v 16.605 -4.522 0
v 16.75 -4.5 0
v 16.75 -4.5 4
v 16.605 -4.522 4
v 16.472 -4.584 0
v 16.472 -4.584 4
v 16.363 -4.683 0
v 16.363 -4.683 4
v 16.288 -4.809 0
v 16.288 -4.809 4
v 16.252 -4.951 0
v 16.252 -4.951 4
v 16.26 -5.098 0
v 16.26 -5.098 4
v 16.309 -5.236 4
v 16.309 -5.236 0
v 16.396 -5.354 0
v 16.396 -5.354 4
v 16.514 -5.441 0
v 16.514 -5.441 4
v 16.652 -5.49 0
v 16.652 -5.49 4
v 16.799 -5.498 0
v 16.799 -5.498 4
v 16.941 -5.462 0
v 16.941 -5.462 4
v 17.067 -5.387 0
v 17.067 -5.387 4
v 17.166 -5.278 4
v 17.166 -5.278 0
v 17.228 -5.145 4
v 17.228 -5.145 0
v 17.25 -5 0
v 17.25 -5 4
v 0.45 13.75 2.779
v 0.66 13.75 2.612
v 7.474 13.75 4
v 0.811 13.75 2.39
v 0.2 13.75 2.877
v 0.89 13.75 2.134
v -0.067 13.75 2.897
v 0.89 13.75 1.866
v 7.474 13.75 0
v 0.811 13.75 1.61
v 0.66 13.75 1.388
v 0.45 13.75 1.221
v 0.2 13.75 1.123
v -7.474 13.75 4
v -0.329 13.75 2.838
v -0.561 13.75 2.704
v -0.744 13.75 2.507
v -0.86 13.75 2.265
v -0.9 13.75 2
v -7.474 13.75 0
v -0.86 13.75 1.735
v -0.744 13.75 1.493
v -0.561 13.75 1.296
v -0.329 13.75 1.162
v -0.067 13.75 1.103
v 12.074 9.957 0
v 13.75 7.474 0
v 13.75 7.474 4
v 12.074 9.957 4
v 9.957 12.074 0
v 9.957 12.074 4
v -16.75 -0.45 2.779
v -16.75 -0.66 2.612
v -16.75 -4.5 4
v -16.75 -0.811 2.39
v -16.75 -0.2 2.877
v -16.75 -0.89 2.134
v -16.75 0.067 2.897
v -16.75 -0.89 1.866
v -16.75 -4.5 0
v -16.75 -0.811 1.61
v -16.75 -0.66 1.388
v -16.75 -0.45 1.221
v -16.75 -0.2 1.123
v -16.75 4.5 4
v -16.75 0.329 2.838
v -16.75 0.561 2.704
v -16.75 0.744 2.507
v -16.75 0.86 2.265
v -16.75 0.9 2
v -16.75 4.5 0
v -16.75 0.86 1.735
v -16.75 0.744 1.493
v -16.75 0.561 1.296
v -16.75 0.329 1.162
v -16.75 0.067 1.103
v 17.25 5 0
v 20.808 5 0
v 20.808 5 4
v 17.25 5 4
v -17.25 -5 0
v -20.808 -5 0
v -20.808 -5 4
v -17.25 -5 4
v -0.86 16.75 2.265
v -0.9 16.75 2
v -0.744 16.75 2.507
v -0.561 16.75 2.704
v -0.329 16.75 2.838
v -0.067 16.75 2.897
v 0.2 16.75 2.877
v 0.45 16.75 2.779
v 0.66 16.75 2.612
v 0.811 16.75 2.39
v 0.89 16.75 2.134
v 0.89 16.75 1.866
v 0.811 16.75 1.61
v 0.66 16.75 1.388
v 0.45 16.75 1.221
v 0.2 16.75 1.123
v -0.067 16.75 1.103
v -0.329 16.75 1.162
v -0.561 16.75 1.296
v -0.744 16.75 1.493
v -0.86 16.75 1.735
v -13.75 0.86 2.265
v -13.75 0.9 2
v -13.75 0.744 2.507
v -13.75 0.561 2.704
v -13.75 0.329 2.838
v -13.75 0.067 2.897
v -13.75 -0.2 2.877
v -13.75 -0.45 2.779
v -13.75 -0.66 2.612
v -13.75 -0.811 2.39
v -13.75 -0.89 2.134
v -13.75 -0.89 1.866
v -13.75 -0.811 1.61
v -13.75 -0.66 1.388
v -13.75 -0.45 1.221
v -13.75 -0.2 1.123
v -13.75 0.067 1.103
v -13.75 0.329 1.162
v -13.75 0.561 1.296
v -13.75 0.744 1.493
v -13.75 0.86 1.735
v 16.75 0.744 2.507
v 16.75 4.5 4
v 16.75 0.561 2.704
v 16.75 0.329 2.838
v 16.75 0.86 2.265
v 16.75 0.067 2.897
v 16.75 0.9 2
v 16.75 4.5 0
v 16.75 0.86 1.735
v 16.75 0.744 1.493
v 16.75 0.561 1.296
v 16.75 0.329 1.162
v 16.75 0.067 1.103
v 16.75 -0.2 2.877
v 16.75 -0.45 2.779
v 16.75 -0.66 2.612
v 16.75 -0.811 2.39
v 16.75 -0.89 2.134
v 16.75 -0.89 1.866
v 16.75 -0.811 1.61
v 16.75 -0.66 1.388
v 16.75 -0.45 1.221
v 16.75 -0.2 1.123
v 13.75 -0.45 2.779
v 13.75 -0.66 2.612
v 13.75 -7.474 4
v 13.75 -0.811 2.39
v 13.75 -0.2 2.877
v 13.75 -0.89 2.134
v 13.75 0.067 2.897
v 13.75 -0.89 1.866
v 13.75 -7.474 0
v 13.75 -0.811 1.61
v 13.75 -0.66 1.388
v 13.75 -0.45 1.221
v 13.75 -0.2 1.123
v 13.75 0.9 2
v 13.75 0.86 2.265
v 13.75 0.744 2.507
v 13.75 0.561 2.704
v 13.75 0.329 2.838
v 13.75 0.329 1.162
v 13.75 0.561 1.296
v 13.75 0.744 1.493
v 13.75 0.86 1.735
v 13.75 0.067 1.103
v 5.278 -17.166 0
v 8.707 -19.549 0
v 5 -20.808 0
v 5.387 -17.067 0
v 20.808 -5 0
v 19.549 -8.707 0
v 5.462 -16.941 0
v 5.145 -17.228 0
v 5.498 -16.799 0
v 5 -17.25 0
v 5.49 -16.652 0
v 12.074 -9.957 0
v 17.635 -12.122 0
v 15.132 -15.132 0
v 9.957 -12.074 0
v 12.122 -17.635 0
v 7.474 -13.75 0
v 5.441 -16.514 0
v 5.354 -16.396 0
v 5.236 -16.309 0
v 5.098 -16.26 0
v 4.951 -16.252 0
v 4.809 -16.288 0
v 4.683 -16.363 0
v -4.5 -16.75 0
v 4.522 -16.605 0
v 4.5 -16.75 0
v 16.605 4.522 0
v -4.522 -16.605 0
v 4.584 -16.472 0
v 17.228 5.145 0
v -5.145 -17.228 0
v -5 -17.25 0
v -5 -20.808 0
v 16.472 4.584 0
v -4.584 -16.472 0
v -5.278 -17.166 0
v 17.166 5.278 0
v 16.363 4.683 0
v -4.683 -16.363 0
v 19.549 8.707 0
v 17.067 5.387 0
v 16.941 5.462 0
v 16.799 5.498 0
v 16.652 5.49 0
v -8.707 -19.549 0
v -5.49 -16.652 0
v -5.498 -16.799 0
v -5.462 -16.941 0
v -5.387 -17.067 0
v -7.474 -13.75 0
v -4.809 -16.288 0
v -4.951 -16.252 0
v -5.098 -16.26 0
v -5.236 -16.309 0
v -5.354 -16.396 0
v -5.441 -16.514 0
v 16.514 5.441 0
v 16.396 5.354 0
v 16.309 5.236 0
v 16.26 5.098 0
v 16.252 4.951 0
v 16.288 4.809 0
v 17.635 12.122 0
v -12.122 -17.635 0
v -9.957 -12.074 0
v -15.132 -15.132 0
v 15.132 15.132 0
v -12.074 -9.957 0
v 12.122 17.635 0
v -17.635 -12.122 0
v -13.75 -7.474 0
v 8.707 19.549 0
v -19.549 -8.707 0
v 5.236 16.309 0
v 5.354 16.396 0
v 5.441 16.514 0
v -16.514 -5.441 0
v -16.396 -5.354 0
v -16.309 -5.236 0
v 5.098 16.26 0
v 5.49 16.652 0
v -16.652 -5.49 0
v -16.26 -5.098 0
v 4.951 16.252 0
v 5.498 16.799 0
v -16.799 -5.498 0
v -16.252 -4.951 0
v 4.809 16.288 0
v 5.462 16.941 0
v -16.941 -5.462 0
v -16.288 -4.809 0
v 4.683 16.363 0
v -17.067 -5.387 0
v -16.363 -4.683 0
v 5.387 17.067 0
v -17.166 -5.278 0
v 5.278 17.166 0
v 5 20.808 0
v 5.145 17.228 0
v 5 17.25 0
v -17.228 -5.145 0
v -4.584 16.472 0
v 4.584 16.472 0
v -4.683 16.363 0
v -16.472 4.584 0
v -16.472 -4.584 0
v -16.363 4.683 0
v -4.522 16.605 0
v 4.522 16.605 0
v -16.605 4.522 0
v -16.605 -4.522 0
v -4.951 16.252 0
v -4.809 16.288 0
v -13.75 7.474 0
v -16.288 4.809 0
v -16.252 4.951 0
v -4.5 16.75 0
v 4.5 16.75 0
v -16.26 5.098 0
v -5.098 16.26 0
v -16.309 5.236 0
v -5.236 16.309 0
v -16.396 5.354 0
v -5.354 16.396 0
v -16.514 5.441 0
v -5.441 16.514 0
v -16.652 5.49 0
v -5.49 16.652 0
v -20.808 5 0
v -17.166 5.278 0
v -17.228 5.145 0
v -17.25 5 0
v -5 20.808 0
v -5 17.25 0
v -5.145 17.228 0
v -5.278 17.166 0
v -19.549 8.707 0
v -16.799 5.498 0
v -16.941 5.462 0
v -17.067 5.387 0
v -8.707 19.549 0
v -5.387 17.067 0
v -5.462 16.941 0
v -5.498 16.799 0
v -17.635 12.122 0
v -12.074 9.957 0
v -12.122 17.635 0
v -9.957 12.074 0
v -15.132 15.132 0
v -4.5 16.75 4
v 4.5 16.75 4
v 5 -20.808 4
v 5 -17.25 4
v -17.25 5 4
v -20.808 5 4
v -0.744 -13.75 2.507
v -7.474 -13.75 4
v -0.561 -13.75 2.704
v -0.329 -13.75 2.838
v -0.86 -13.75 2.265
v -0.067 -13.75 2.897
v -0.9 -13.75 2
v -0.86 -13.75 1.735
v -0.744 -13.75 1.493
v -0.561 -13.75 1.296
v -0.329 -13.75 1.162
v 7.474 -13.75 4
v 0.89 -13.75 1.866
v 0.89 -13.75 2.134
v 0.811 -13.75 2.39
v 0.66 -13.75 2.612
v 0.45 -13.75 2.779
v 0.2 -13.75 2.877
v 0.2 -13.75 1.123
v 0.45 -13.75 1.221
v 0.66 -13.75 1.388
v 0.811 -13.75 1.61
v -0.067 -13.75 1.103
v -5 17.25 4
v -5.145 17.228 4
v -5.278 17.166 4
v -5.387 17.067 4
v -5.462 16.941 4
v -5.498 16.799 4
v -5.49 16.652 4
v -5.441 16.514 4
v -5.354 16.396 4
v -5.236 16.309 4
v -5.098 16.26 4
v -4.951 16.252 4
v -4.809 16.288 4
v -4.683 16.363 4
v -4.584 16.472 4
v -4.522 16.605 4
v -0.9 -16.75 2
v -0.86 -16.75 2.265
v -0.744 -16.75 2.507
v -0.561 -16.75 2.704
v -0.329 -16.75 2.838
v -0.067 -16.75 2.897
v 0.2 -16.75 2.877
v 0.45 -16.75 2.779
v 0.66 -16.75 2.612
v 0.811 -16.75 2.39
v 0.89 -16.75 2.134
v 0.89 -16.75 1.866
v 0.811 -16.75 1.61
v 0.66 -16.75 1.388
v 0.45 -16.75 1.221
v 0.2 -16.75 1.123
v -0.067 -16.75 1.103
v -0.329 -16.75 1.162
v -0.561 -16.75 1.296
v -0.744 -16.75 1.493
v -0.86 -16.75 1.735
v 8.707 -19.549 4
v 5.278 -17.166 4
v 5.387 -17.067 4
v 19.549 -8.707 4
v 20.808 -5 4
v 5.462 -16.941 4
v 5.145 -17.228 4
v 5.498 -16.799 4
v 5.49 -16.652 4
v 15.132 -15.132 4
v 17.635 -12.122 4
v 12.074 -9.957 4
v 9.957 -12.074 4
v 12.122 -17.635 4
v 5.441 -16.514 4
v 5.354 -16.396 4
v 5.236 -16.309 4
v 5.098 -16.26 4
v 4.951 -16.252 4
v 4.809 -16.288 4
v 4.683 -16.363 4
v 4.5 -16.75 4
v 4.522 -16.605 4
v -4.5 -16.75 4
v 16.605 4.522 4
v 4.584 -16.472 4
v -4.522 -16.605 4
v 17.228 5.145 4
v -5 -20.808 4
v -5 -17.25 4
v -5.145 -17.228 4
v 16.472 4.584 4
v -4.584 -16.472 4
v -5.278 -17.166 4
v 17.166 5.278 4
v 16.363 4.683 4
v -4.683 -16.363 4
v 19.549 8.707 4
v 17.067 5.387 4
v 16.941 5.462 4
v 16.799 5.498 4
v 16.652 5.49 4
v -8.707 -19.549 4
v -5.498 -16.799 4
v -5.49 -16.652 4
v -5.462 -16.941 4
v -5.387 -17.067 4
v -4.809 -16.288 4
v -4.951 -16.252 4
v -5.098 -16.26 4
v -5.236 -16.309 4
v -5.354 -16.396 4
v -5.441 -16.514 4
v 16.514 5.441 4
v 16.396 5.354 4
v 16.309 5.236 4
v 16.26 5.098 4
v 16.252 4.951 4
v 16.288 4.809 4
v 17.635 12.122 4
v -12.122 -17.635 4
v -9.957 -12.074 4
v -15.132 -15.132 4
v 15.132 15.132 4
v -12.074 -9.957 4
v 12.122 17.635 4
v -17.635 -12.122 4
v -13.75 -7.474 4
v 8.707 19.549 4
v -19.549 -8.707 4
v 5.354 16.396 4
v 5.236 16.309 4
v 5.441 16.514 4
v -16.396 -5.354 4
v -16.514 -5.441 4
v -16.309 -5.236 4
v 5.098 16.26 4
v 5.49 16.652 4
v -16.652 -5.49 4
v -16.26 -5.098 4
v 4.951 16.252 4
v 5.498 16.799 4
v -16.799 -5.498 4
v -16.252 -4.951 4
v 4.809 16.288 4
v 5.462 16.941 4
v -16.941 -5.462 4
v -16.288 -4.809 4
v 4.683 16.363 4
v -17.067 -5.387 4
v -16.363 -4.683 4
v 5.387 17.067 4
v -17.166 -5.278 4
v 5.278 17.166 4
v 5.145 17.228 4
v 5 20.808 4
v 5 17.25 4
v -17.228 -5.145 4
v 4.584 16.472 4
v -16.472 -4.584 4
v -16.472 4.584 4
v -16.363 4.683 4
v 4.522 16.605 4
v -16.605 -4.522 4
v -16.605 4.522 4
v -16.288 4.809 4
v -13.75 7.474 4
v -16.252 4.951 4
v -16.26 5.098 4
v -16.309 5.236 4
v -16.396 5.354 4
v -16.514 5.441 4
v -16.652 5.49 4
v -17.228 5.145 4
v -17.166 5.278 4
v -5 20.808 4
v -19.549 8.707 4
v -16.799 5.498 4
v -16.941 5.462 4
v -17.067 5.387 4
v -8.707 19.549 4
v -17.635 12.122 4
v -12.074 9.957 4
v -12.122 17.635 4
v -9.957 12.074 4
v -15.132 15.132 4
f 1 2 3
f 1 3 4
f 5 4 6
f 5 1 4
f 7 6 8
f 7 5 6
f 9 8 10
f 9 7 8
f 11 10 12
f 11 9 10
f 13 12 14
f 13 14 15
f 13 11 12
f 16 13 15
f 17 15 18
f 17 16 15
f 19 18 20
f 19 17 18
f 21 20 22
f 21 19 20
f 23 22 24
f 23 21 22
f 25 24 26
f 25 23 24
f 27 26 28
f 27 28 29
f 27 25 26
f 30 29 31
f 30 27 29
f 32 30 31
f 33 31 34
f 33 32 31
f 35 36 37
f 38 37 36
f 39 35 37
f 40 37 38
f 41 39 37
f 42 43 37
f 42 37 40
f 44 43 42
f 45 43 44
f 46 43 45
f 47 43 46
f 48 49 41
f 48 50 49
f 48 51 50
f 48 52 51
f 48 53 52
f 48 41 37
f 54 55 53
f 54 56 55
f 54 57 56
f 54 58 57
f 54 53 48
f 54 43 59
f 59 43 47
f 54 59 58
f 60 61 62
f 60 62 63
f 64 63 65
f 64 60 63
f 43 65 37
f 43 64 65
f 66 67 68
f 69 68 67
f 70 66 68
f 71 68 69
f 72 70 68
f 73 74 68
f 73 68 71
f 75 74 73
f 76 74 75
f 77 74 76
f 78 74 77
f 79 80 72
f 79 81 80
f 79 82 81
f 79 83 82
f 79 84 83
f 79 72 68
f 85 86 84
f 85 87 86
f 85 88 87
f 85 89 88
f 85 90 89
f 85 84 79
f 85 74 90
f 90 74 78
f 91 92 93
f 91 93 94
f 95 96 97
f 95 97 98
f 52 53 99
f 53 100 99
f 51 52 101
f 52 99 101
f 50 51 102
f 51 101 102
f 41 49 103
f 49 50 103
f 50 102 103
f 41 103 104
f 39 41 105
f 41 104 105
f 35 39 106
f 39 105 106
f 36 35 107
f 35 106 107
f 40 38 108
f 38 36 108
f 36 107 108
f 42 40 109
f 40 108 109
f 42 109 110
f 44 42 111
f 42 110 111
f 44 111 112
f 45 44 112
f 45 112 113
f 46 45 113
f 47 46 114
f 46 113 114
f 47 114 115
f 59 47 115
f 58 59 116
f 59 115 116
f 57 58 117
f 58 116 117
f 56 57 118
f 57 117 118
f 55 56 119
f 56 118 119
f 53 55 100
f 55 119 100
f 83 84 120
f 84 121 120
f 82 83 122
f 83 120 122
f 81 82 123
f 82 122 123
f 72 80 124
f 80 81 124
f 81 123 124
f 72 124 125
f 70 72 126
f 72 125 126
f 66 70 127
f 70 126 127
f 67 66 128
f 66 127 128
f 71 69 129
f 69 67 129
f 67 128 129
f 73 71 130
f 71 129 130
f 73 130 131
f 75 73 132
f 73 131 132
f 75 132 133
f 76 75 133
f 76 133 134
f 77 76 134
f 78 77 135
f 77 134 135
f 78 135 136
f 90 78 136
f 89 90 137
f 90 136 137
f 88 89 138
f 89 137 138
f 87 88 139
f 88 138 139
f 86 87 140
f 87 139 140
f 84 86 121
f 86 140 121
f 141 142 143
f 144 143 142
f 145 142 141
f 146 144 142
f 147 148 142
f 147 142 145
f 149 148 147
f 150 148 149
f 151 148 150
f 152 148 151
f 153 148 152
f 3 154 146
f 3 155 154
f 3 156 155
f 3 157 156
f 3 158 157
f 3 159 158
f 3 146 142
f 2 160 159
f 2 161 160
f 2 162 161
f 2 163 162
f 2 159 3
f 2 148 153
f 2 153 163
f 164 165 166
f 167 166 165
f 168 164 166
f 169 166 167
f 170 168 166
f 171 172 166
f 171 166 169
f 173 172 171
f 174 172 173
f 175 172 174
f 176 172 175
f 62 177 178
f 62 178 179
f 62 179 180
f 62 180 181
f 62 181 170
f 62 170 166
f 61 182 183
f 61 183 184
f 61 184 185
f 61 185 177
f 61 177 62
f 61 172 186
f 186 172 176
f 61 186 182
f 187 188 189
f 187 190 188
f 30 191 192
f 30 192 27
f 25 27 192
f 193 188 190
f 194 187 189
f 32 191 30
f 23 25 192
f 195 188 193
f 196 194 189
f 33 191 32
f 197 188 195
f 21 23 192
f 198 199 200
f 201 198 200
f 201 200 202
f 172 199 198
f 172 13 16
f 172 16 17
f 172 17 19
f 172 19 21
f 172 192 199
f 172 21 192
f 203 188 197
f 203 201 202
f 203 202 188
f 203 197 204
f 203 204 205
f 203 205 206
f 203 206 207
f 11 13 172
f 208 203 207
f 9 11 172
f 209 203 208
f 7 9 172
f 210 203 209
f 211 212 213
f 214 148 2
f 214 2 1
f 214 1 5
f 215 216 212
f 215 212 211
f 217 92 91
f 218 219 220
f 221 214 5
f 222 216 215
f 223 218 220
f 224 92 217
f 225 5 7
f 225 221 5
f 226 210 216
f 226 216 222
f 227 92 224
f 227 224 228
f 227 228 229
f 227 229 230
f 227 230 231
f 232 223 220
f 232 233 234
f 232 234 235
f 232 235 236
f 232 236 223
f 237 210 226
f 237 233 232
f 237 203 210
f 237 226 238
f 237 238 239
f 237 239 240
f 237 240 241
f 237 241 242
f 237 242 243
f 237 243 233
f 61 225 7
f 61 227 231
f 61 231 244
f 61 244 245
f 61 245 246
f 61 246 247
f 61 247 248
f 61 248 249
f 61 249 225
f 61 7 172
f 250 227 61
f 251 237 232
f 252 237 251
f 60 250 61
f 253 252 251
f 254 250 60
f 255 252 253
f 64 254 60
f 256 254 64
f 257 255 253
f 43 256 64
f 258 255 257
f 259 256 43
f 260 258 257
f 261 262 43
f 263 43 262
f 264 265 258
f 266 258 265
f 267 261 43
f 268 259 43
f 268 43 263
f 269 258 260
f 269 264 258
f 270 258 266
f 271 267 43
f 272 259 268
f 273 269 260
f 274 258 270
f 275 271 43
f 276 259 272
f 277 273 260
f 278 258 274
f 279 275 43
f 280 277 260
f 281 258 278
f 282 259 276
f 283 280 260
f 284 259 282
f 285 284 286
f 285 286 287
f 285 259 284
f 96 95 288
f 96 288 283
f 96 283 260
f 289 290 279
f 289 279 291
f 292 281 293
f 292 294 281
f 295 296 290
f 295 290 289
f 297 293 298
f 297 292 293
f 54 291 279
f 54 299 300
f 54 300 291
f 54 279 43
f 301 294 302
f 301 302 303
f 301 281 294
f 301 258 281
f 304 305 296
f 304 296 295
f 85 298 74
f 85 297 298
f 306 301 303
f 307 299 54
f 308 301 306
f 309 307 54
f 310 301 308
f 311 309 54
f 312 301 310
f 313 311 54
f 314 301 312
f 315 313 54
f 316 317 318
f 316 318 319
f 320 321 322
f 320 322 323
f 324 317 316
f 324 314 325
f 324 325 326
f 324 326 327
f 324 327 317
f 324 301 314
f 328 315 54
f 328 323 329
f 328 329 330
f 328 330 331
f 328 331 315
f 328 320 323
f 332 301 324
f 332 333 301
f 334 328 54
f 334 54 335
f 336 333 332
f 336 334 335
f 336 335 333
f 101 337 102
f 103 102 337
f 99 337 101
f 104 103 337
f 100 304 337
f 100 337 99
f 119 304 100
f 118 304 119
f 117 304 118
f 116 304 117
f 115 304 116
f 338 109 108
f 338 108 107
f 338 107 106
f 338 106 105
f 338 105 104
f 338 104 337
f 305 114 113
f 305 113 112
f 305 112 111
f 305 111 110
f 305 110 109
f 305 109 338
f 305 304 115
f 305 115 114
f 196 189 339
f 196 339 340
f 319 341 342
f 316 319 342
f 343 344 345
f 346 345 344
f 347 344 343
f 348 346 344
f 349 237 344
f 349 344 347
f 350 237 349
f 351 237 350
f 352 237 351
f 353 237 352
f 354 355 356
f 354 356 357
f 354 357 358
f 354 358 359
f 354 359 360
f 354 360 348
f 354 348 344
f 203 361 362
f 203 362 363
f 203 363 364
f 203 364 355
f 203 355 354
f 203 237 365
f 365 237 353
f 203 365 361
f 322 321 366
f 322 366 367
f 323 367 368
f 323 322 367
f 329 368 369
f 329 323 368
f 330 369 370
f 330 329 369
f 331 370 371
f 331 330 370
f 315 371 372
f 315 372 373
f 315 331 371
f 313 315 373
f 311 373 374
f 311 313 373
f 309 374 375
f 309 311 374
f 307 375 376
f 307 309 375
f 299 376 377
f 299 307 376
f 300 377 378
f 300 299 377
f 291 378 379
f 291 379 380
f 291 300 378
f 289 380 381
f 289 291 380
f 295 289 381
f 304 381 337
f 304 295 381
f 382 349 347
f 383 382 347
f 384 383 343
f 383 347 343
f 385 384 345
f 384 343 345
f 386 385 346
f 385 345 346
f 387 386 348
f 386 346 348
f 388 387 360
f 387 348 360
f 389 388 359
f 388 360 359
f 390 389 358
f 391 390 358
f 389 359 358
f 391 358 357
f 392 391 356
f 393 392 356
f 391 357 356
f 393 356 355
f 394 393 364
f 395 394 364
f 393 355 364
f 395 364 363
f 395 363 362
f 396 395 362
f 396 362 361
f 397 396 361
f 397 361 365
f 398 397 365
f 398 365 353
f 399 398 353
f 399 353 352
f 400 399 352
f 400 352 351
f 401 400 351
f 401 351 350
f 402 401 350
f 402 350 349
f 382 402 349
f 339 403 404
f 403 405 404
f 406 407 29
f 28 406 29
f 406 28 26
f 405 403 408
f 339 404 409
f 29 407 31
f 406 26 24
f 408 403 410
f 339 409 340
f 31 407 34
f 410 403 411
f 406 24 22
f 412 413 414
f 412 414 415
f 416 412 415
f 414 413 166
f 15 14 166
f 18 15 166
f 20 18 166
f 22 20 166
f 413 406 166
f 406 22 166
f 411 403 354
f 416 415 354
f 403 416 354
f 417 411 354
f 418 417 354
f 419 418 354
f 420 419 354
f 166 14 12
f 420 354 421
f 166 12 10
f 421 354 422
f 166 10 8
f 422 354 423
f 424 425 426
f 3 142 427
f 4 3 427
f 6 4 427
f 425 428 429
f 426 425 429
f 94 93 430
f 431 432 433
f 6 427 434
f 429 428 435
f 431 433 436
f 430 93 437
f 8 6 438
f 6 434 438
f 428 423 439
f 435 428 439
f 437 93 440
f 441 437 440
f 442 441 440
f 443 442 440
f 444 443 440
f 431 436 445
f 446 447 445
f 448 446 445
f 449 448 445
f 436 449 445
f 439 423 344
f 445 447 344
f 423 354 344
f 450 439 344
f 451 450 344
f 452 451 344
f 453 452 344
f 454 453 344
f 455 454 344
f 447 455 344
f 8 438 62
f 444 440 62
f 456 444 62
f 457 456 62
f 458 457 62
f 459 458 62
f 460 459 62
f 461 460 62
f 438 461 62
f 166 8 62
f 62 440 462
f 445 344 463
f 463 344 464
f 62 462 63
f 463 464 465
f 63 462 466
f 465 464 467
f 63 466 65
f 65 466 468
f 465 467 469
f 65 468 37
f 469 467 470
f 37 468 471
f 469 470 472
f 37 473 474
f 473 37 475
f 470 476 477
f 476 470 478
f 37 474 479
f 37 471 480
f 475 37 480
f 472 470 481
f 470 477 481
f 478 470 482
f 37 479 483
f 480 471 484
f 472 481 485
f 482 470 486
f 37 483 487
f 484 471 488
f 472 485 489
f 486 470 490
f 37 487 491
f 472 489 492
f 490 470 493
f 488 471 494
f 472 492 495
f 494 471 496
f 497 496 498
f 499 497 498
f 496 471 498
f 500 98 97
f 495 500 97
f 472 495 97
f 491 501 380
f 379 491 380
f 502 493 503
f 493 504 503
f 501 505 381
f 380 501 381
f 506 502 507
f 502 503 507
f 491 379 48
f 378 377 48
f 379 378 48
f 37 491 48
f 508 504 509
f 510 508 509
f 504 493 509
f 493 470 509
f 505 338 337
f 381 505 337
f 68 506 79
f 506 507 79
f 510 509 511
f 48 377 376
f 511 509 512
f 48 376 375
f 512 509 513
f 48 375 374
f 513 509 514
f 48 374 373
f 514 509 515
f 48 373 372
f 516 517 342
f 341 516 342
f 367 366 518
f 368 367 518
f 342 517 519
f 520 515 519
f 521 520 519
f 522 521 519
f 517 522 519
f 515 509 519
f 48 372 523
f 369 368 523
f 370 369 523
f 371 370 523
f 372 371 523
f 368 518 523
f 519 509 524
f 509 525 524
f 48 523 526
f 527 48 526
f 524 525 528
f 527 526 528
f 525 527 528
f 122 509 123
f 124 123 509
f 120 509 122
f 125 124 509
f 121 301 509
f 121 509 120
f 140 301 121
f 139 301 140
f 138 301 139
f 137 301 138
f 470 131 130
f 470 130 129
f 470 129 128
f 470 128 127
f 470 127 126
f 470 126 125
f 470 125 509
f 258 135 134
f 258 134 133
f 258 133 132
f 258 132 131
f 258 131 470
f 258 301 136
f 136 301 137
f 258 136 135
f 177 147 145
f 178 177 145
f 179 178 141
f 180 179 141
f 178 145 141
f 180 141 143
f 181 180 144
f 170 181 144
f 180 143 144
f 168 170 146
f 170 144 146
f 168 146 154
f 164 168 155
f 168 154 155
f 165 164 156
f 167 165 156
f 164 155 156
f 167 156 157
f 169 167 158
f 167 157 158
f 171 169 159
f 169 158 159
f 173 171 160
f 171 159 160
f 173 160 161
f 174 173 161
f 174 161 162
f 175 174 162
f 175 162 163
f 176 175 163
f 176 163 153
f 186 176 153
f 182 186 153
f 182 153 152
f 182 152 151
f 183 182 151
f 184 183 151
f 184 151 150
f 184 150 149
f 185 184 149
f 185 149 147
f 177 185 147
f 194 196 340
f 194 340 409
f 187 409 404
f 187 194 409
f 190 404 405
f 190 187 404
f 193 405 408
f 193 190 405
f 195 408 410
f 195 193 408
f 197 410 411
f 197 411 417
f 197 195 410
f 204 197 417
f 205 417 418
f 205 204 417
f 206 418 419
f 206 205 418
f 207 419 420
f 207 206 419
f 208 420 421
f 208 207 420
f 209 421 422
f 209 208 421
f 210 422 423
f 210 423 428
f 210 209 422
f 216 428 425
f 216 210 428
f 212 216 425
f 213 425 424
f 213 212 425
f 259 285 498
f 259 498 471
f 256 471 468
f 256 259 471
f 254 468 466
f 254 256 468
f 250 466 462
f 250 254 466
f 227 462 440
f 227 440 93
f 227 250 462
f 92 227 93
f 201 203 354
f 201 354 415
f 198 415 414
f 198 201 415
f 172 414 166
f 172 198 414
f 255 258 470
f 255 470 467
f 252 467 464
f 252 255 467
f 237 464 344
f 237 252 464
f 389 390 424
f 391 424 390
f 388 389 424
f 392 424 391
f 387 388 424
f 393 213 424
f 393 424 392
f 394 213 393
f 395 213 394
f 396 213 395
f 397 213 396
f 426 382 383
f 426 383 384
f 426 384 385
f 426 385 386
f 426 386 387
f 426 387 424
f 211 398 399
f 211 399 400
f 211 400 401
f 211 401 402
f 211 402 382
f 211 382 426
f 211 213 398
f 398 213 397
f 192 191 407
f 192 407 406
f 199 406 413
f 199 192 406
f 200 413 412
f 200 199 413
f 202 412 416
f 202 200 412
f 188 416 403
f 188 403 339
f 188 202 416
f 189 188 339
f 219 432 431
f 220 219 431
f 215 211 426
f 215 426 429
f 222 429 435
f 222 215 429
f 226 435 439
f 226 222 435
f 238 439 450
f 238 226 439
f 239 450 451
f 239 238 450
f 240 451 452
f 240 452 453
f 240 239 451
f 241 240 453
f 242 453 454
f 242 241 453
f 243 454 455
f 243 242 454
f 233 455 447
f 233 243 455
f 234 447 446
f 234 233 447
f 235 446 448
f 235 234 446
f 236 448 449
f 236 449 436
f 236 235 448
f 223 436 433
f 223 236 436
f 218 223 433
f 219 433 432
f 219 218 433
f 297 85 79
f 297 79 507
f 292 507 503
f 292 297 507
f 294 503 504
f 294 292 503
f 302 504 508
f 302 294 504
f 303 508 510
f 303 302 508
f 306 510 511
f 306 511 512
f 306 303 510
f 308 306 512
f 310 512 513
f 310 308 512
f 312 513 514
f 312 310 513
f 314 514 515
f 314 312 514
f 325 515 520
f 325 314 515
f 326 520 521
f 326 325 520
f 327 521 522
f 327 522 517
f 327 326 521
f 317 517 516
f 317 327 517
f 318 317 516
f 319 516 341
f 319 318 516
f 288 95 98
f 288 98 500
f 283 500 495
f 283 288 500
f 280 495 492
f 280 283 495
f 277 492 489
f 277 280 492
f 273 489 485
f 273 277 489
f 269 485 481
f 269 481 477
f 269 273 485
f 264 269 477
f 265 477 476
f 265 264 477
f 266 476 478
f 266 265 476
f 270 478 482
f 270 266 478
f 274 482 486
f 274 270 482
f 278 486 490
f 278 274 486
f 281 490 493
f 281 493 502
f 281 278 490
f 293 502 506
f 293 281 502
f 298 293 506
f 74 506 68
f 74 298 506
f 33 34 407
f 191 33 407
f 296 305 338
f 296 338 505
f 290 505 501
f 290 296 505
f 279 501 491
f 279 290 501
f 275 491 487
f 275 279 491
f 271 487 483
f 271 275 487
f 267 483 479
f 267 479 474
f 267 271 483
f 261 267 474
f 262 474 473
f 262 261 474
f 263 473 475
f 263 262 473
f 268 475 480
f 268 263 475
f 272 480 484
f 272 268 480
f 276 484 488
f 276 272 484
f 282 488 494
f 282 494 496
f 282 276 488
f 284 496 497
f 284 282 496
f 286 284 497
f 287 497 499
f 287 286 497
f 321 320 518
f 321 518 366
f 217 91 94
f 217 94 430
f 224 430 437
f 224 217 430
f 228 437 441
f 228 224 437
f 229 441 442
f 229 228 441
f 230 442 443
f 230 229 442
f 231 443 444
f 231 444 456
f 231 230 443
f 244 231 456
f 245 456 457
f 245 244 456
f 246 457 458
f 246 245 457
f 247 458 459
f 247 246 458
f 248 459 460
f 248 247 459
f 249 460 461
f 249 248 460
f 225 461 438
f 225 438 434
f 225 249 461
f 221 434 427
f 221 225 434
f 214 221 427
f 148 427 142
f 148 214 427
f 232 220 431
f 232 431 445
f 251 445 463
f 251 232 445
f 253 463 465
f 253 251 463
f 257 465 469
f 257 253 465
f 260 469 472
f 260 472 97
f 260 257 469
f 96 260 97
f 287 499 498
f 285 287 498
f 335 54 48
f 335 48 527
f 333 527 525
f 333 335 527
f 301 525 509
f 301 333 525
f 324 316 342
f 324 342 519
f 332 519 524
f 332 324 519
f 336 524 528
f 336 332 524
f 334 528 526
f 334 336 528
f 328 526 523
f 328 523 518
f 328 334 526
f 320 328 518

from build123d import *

# Parameters (mm, degrees)
EXTRUDE_1_DEPTH          = 4
SKETCH_2_R               = 0.9
CUT_EXTRUDE_1_DEPTH      = 43
PATTERN_CIRCULAR_1_COUNT = 4


with BuildPart() as part:
    # 草图1 → 凸台-拉伸1 (new body)
    with BuildSketch(Plane.XY):
        with BuildLine():
            Line((-4.5, 16.75), (4.5, 16.75))
            ThreePointArc((4.5, 16.75), (5.353553391, 16.396446609), (5, 17.25))
            Line((5, 17.25), (5, 20.807690886))
            ThreePointArc((5, 20.807690886), (15.132085117, 15.132085117), (20.807690886, 5))
            Line((20.807690886, 5), (17.25, 5))
            ThreePointArc((17.25, 5), (16.396446609, 5.353553391), (16.75, 4.5))
            Line((16.75, 4.5), (16.75, -4.5))
            ThreePointArc((16.75, -4.5), (16.396446609, -5.353553391), (17.25, -5))
            Line((17.25, -5), (20.807690886, -5))
            ThreePointArc((20.807690886, -5), (15.132085117, -15.132085117), (5, -20.807690886))
            Line((5, -20.807690886), (5, -17.25))
            ThreePointArc((5, -17.25), (5.353553391, -16.396446609), (4.5, -16.75))
            Line((4.5, -16.75), (-4.5, -16.75))
            ThreePointArc((-4.5, -16.75), (-5.353553391, -16.396446609), (-5, -17.25))
            Line((-5, -17.25), (-5, -20.807690886))
            ThreePointArc((-5, -20.807690886), (-15.132085117, -15.132085117), (-20.807690886, -5))
            Line((-20.807690886, -5), (-17.25, -5))
            ThreePointArc((-17.25, -5), (-16.396446609, -5.353553391), (-16.75, -4.5))
            Line((-16.75, -4.5), (-16.75, 4.5))
            ThreePointArc((-16.75, 4.5), (-16.396446609, 5.353553391), (-17.25, 5))
            Line((-17.25, 5), (-20.807690886, 5))
            ThreePointArc((-20.807690886, 5), (-15.132085117, 15.132085117), (-5, 20.807690886))
            Line((-5, 20.807690886), (-5, 17.25))
            ThreePointArc((-5, 17.25), (-5.353553391, 16.396446609), (-4.5, 16.75))
        make_face()
        with BuildLine():
            Line((-7.473954776, -13.75), (7.473954776, -13.75))
            ThreePointArc((7.473954776, -13.75), (11.066221126, -11.066221126), (13.75, -7.473954776))
            Line((13.75, -7.473954776), (13.75, 7.473954776))
            ThreePointArc((13.75, 7.473954776), (11.066221126, 11.066221126), (7.473954776, 13.75))
            Line((7.473954776, 13.75), (-7.473954776, 13.75))
            ThreePointArc((-7.473954776, 13.75), (-11.066221126, 11.066221126), (-13.75, 7.473954776))
            Line((-13.75, 7.473954776), (-13.75, -7.473954776))
            ThreePointArc((-13.75, -7.473954776), (-11.066221126, -11.066221126), (-7.473954776, -13.75))
        make_face(mode=Mode.SUBTRACT)
    extrude(amount=EXTRUDE_1_DEPTH)

    # 草图2 → 切除-拉伸1 (cut)
    with BuildSketch(Plane(origin=(0, 16.75, 0), x_dir=(1, 0, 0), z_dir=(0, 1, 0))):
        with Locations(Location((0, -2, 0), (0, 0, 180))):
            Circle(SKETCH_2_R)
    cut_extrude_1 = extrude(amount=-CUT_EXTRUDE_1_DEPTH, mode=Mode.SUBTRACT)

    # 阵列(圆周)1: 切除-拉伸1 ×4 about axis
    pattern_circular_1_axis = Axis((0, 0, 4), (0, 0, -1))
    for i in range(1, PATTERN_CIRCULAR_1_COUNT):
        add(cut_extrude_1.rotate(pattern_circular_1_axis, i * 360 / PATTERN_CIRCULAR_1_COUNT), mode=Mode.SUBTRACT)


solid = part.part
